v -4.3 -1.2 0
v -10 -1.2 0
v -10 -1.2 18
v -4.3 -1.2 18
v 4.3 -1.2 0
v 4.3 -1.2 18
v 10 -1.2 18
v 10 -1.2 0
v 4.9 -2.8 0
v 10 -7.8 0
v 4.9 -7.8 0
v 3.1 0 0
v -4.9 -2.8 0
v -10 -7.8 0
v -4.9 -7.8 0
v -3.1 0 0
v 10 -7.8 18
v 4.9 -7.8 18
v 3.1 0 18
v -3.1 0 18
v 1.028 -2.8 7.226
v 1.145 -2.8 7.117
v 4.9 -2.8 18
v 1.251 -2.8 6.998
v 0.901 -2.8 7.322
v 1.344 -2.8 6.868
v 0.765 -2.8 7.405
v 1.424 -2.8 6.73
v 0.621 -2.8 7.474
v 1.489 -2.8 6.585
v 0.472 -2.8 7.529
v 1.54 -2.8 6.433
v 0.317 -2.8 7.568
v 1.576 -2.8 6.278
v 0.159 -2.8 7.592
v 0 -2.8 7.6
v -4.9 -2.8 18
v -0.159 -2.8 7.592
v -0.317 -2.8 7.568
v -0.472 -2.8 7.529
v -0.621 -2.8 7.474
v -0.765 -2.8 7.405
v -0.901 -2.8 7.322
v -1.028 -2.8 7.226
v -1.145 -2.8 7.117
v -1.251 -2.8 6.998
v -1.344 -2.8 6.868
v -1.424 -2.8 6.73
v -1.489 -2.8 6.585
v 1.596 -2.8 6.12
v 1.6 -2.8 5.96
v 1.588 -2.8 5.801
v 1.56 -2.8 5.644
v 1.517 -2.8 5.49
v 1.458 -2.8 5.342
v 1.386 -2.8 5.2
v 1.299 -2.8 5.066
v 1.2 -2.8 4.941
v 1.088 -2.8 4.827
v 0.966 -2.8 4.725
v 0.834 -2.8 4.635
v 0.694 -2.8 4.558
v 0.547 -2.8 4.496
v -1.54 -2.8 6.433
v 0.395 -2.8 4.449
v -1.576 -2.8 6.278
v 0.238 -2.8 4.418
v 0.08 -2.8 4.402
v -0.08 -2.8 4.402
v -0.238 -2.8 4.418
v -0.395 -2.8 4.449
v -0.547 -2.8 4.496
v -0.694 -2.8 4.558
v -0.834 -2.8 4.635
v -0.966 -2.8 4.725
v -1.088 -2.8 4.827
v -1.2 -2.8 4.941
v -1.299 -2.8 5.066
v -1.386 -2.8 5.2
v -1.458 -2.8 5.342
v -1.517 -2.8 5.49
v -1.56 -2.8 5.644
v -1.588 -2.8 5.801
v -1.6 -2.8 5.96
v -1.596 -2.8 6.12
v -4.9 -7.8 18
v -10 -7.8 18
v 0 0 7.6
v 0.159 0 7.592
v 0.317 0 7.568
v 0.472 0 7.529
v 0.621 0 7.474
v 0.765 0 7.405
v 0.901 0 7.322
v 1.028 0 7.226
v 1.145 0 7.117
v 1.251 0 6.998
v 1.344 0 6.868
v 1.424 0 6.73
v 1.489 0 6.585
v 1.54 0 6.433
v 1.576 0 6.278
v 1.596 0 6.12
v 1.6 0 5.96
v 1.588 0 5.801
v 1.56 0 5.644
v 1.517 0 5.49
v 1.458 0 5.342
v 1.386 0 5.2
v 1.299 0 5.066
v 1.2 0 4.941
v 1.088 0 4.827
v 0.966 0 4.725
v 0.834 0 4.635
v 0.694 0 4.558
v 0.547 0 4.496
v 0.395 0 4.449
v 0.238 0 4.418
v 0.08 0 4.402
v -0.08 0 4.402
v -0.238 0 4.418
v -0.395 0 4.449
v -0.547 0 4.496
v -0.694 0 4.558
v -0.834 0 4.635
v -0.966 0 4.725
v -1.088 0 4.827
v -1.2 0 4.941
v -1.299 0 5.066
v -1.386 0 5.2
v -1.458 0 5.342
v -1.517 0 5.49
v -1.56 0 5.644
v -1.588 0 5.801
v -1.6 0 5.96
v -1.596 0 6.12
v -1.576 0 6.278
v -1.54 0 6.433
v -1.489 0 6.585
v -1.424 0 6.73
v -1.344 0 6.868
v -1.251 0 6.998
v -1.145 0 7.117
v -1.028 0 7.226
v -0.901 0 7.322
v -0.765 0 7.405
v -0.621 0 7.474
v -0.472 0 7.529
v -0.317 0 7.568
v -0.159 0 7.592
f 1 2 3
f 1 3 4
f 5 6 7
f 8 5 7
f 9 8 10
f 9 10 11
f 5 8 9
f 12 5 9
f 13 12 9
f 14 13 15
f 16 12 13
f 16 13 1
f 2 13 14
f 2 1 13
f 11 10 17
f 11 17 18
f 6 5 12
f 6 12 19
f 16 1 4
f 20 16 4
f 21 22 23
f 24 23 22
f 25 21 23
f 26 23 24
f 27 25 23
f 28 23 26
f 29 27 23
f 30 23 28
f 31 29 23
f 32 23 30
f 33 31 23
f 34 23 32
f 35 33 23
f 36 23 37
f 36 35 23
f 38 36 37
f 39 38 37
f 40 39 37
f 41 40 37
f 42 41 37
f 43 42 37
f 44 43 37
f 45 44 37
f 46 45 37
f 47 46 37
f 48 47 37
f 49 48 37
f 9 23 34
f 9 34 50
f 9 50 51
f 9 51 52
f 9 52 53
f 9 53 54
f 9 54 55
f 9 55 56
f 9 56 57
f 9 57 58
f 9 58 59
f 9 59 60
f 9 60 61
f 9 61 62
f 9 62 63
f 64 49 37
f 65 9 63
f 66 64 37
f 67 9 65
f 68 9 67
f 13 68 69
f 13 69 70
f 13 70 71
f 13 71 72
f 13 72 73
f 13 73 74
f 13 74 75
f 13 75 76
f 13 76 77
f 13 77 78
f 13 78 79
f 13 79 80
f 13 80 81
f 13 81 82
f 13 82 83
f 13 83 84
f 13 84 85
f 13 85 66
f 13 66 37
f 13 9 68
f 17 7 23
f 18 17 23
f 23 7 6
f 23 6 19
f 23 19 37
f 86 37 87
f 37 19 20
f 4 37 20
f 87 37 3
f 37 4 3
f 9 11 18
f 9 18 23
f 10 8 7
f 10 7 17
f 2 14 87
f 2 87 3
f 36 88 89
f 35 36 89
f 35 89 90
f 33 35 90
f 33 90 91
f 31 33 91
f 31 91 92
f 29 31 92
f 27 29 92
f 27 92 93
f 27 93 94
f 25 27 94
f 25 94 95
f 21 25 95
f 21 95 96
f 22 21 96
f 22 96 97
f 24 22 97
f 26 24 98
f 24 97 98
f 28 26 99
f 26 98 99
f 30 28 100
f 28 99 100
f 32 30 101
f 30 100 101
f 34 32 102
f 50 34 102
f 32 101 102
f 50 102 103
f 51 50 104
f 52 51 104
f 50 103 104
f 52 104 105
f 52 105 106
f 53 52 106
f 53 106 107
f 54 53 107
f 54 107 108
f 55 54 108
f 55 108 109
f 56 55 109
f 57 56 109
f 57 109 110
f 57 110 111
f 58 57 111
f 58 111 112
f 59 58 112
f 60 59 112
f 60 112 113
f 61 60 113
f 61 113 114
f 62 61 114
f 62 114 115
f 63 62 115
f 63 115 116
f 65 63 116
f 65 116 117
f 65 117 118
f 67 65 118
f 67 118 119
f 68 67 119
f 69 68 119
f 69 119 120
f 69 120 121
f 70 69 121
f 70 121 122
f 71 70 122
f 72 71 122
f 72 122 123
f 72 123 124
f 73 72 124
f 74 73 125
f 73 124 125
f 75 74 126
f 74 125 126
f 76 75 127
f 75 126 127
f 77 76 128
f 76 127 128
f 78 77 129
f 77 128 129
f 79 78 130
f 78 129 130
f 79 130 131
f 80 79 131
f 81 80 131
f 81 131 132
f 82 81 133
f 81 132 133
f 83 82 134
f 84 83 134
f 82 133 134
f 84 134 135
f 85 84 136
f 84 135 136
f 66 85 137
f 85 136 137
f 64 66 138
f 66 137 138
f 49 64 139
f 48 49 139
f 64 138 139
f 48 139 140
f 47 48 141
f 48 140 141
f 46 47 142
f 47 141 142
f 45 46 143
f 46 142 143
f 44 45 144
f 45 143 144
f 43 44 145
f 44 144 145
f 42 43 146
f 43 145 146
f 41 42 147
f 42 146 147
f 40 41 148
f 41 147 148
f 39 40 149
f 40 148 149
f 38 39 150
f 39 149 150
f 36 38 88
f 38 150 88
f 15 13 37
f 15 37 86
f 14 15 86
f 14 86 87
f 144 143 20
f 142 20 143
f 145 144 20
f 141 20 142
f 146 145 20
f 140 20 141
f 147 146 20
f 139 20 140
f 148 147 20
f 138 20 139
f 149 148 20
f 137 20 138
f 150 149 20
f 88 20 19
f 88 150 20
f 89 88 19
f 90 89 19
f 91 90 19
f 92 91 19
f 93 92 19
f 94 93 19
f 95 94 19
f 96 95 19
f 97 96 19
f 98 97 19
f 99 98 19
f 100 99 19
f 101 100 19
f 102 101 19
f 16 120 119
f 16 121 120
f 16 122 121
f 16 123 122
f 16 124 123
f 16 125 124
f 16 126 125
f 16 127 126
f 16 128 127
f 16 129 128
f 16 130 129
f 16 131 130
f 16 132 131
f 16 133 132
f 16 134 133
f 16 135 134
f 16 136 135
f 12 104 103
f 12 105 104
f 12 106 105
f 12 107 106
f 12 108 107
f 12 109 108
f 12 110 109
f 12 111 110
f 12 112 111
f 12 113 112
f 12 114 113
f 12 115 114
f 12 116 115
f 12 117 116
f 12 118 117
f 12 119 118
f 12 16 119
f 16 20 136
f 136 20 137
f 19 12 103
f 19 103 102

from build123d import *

# Parameters (mm, degrees)
BOSS_EXTRUDE2_DEPTH = 18
SKETCH3_R           = 1.6
CUT_EXTRUDE1_DEPTH  = 24
CHAMFER1_SIZE       = 1.2


with BuildPart() as part:
    # Sketch2 → Boss-Extrude2 (new body)
    with BuildSketch(Plane.XY):
        Polygon((-3.1, 0), (3.1, 0), (3.1, -1.2), (10, -1.2), (10, -7.8), (4.9, -7.8), (4.9, -2.8), (-4.9, -2.8), (-4.9, -7.8), (-10, -7.8), (-10, -1.2), (-3.1, -1.2), align=None)
    extrude(amount=BOSS_EXTRUDE2_DEPTH)

    # Sketch3 → Cut-Extrude1 (cut)
    with BuildSketch(Plane(origin=(0, 0, 0), x_dir=(1, 0, 0), z_dir=(0, 1, 0))):
        with Locations(Location((0, -6, 0), (0, 0, 270))):
            Circle(SKETCH3_R)
    extrude(amount=-CUT_EXTRUDE1_DEPTH, mode=Mode.SUBTRACT)

    # Chamfer1
    chamfer1_edges = [part.edges().sort_by_distance(p)[0] for p in [
        (3.1, -1.2, 9),
        (-3.1, -1.2, 9),
    ]]
    chamfer(chamfer1_edges, length=CHAMFER1_SIZE - 0.0001)  # a hair under: the kernel refuses the full size


solid = part.part
